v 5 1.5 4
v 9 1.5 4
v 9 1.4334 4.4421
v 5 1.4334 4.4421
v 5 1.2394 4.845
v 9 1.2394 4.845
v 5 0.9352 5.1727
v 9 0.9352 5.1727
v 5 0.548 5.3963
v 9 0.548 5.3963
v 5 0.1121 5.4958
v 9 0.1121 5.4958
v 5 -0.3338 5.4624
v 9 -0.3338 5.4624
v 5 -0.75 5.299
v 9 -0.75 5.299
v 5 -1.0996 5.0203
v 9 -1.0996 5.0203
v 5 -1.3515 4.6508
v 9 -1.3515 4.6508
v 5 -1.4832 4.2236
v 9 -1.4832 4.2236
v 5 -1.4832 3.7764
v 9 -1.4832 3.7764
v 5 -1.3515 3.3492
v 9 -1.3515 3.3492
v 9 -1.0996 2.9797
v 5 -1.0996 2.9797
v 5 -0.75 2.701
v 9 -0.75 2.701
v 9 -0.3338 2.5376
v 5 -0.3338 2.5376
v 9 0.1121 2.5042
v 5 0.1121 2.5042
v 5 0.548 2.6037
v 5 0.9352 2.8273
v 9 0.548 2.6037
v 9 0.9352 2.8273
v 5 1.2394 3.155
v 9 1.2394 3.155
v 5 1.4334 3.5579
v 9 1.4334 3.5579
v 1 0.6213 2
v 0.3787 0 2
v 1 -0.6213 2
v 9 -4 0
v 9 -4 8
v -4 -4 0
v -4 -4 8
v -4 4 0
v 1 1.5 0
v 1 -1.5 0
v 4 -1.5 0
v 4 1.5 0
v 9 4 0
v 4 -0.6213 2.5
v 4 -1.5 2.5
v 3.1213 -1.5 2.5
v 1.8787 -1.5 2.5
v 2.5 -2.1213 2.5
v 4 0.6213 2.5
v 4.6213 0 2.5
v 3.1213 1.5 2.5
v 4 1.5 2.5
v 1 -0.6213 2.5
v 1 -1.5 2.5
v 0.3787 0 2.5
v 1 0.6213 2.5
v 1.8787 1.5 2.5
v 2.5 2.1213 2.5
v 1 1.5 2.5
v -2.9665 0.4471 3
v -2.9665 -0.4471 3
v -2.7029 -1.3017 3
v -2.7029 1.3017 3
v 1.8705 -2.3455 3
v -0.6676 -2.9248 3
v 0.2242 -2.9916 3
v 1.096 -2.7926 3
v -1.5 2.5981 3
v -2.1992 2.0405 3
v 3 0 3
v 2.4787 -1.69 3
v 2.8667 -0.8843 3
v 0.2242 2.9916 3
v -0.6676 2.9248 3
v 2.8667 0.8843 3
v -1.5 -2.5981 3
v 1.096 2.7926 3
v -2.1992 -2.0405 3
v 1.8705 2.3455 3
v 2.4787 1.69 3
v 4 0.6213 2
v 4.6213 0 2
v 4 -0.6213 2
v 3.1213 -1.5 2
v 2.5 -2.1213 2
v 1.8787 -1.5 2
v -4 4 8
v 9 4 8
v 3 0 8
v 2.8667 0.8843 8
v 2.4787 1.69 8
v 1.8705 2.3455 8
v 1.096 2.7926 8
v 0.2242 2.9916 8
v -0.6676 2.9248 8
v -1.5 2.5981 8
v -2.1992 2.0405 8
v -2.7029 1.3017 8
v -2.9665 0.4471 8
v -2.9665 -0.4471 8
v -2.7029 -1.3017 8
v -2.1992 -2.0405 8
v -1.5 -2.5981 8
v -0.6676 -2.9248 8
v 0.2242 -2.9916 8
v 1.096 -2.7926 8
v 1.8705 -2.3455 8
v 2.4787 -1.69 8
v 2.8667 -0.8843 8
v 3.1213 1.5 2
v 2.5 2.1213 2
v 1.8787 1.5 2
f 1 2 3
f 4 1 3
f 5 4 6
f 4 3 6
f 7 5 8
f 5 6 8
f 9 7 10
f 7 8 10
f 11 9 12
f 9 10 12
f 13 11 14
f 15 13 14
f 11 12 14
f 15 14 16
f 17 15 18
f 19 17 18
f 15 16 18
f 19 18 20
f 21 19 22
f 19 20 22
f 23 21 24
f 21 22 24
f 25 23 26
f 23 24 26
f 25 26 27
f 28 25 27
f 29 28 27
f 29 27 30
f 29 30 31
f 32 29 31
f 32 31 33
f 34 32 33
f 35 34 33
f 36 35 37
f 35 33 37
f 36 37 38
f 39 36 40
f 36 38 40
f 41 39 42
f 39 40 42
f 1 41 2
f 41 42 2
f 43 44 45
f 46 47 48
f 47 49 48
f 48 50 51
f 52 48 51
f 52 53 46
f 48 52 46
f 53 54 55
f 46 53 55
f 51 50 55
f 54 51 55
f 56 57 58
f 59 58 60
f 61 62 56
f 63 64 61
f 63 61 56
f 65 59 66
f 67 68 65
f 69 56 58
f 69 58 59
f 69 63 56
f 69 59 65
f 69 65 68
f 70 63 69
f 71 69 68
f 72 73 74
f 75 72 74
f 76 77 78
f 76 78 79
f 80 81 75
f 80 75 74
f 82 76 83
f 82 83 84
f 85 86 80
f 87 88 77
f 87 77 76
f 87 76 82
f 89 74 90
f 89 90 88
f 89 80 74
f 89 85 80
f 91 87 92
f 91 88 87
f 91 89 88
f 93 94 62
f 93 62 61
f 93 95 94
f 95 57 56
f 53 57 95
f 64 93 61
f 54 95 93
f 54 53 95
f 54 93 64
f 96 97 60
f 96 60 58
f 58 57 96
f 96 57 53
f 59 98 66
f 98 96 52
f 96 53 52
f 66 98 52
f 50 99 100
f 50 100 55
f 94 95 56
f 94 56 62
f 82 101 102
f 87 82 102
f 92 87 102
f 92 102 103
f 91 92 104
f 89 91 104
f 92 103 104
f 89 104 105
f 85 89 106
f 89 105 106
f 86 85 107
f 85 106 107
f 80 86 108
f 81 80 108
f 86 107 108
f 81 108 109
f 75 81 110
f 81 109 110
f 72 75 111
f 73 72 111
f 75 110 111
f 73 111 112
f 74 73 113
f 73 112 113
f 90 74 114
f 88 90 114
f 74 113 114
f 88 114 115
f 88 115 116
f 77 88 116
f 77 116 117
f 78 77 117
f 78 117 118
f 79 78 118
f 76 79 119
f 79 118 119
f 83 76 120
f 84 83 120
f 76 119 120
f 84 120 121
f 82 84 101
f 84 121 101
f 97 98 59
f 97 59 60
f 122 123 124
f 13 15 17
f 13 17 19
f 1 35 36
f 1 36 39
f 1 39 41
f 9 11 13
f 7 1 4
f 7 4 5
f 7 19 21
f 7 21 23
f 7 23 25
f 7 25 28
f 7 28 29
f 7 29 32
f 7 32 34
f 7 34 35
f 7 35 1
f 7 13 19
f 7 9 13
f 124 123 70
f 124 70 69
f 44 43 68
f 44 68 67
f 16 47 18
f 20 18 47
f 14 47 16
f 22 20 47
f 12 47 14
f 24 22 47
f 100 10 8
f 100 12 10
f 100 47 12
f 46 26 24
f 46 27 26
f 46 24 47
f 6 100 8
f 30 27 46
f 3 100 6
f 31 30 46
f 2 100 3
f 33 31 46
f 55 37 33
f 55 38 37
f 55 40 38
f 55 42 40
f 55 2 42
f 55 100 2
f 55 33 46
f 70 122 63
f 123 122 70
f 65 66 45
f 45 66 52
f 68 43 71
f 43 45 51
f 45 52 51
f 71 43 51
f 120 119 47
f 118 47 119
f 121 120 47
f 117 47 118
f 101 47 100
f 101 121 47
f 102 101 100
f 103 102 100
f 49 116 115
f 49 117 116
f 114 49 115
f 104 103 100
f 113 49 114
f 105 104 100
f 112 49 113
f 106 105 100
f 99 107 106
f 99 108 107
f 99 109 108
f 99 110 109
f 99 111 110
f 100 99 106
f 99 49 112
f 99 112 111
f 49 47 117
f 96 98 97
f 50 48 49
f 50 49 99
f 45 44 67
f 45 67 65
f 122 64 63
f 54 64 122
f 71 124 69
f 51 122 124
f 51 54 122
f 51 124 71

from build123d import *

# Parameters (mm, degrees)
SKETCH2_W           = 8
SKETCH2_H           = 8
BOSS_EXTRUDE1_DEPTH = 8
SKETCH3_R           = 3
CUT_EXTRUDE1_DEPTH  = 5
SKETCH5_W           = 8
SKETCH5_H           = 8
BOSS_EXTRUDE2_DEPTH = 5
SKETCH6_R           = 1.5
CUT_EXTRUDE2_DEPTH  = 4
CUT_EXTRUDE3_DEPTH  = 2.5
BOSS_EXTRUDE4_DEPTH = 2
CUT_EXTRUDE4_DEPTH  = 1
BOSS_EXTRUDE5_DEPTH = 2
SKETCH11_W          = 3
SKETCH11_H          = 3
CUT_EXTRUDE8_DEPTH  = 2.5


with BuildPart() as part:
    # Sketch2 → Boss-Extrude1 (new body)
    with BuildSketch(Plane.XY):
        Rectangle(SKETCH2_W, SKETCH2_H)
    extrude(amount=BOSS_EXTRUDE1_DEPTH)

    # Sketch3 → Cut-Extrude1 (cut)
    with BuildSketch(Plane.XY.offset(8)):
        Circle(SKETCH3_R)
    extrude(amount=-CUT_EXTRUDE1_DEPTH, mode=Mode.SUBTRACT)

    # Sketch5 → Boss-Extrude2 (add)
    with BuildSketch(Plane(origin=(4, 0, 0), x_dir=(0, 0, -1), z_dir=(1, 0, 0))):
        with Locations((-4, 0)):
            Rectangle(SKETCH5_W, SKETCH5_H)
    extrude(amount=BOSS_EXTRUDE2_DEPTH)

    # Sketch6 → Cut-Extrude2 (cut)
    with BuildSketch(Plane(origin=(9, 0, 0), x_dir=(0, 0, -1), z_dir=(1, 0, 0))):
        with Locations(Location((-4, 0, 0), (0, 0, 90))):
            Circle(SKETCH6_R)
    extrude(amount=-CUT_EXTRUDE2_DEPTH, mode=Mode.SUBTRACT)

    # Sketch7 → Cut-Extrude3 (cut)
    with BuildSketch(Plane(origin=(0, 0, 0), x_dir=(-1, 0, 0), z_dir=(0, 0, -1))):
        Polygon((-2.5, 2.121320344), (-0.378679656, 0), (-2.5, -2.121320344), (-4.621320344, 0), align=None)
    extrude(amount=-CUT_EXTRUDE3_DEPTH, mode=Mode.SUBTRACT)

    # Sketch8 → Boss-Extrude4 (add)
    with BuildSketch(Plane(origin=(0, 0, 0), x_dir=(-1, 0, 0), z_dir=(0, 0, -1))):
        Polygon((-4.621320344, 0), (-2.5, 2.121320344), (-0.378679656, 0), (-2.5, -2.121320344), align=None)
    extrude(amount=-BOSS_EXTRUDE4_DEPTH)

    # Sketch9 → Cut-Extrude4 (cut)
    with BuildSketch(Plane(origin=(0, 0, 0), x_dir=(-1, 0, 0), z_dir=(0, 0, -1))):
        Polygon((-6.487359326, 0), (-5.148694176, 2.68476733), (-2.463926846, 1.346102179), (-3.802591997, -1.338665151), align=None)
    extrude(amount=-CUT_EXTRUDE4_DEPTH, mode=Mode.SUBTRACT)

    # Sketch10 → Boss-Extrude5 (add)
    with BuildSketch(Plane(origin=(0, 0, 0), x_dir=(-1, 0, 0), z_dir=(0, 0, -1))):
        Polygon((-5.148694176, 2.68476733), (-2.463926846, 1.346102179), (-3.802591997, -1.338665151), (-6.487359326, 0), align=None)
    extrude(amount=-BOSS_EXTRUDE5_DEPTH)

    # Sketch11 → Cut-Extrude8 (cut)
    with BuildSketch(Plane(origin=(0, 0, 0), x_dir=(-1, 0, 0), z_dir=(0, 0, -1))):
        with Locations((-2.5, 0)):
            Rectangle(SKETCH11_W, SKETCH11_H)
    extrude(amount=-CUT_EXTRUDE8_DEPTH, mode=Mode.SUBTRACT)


solid = part.part
